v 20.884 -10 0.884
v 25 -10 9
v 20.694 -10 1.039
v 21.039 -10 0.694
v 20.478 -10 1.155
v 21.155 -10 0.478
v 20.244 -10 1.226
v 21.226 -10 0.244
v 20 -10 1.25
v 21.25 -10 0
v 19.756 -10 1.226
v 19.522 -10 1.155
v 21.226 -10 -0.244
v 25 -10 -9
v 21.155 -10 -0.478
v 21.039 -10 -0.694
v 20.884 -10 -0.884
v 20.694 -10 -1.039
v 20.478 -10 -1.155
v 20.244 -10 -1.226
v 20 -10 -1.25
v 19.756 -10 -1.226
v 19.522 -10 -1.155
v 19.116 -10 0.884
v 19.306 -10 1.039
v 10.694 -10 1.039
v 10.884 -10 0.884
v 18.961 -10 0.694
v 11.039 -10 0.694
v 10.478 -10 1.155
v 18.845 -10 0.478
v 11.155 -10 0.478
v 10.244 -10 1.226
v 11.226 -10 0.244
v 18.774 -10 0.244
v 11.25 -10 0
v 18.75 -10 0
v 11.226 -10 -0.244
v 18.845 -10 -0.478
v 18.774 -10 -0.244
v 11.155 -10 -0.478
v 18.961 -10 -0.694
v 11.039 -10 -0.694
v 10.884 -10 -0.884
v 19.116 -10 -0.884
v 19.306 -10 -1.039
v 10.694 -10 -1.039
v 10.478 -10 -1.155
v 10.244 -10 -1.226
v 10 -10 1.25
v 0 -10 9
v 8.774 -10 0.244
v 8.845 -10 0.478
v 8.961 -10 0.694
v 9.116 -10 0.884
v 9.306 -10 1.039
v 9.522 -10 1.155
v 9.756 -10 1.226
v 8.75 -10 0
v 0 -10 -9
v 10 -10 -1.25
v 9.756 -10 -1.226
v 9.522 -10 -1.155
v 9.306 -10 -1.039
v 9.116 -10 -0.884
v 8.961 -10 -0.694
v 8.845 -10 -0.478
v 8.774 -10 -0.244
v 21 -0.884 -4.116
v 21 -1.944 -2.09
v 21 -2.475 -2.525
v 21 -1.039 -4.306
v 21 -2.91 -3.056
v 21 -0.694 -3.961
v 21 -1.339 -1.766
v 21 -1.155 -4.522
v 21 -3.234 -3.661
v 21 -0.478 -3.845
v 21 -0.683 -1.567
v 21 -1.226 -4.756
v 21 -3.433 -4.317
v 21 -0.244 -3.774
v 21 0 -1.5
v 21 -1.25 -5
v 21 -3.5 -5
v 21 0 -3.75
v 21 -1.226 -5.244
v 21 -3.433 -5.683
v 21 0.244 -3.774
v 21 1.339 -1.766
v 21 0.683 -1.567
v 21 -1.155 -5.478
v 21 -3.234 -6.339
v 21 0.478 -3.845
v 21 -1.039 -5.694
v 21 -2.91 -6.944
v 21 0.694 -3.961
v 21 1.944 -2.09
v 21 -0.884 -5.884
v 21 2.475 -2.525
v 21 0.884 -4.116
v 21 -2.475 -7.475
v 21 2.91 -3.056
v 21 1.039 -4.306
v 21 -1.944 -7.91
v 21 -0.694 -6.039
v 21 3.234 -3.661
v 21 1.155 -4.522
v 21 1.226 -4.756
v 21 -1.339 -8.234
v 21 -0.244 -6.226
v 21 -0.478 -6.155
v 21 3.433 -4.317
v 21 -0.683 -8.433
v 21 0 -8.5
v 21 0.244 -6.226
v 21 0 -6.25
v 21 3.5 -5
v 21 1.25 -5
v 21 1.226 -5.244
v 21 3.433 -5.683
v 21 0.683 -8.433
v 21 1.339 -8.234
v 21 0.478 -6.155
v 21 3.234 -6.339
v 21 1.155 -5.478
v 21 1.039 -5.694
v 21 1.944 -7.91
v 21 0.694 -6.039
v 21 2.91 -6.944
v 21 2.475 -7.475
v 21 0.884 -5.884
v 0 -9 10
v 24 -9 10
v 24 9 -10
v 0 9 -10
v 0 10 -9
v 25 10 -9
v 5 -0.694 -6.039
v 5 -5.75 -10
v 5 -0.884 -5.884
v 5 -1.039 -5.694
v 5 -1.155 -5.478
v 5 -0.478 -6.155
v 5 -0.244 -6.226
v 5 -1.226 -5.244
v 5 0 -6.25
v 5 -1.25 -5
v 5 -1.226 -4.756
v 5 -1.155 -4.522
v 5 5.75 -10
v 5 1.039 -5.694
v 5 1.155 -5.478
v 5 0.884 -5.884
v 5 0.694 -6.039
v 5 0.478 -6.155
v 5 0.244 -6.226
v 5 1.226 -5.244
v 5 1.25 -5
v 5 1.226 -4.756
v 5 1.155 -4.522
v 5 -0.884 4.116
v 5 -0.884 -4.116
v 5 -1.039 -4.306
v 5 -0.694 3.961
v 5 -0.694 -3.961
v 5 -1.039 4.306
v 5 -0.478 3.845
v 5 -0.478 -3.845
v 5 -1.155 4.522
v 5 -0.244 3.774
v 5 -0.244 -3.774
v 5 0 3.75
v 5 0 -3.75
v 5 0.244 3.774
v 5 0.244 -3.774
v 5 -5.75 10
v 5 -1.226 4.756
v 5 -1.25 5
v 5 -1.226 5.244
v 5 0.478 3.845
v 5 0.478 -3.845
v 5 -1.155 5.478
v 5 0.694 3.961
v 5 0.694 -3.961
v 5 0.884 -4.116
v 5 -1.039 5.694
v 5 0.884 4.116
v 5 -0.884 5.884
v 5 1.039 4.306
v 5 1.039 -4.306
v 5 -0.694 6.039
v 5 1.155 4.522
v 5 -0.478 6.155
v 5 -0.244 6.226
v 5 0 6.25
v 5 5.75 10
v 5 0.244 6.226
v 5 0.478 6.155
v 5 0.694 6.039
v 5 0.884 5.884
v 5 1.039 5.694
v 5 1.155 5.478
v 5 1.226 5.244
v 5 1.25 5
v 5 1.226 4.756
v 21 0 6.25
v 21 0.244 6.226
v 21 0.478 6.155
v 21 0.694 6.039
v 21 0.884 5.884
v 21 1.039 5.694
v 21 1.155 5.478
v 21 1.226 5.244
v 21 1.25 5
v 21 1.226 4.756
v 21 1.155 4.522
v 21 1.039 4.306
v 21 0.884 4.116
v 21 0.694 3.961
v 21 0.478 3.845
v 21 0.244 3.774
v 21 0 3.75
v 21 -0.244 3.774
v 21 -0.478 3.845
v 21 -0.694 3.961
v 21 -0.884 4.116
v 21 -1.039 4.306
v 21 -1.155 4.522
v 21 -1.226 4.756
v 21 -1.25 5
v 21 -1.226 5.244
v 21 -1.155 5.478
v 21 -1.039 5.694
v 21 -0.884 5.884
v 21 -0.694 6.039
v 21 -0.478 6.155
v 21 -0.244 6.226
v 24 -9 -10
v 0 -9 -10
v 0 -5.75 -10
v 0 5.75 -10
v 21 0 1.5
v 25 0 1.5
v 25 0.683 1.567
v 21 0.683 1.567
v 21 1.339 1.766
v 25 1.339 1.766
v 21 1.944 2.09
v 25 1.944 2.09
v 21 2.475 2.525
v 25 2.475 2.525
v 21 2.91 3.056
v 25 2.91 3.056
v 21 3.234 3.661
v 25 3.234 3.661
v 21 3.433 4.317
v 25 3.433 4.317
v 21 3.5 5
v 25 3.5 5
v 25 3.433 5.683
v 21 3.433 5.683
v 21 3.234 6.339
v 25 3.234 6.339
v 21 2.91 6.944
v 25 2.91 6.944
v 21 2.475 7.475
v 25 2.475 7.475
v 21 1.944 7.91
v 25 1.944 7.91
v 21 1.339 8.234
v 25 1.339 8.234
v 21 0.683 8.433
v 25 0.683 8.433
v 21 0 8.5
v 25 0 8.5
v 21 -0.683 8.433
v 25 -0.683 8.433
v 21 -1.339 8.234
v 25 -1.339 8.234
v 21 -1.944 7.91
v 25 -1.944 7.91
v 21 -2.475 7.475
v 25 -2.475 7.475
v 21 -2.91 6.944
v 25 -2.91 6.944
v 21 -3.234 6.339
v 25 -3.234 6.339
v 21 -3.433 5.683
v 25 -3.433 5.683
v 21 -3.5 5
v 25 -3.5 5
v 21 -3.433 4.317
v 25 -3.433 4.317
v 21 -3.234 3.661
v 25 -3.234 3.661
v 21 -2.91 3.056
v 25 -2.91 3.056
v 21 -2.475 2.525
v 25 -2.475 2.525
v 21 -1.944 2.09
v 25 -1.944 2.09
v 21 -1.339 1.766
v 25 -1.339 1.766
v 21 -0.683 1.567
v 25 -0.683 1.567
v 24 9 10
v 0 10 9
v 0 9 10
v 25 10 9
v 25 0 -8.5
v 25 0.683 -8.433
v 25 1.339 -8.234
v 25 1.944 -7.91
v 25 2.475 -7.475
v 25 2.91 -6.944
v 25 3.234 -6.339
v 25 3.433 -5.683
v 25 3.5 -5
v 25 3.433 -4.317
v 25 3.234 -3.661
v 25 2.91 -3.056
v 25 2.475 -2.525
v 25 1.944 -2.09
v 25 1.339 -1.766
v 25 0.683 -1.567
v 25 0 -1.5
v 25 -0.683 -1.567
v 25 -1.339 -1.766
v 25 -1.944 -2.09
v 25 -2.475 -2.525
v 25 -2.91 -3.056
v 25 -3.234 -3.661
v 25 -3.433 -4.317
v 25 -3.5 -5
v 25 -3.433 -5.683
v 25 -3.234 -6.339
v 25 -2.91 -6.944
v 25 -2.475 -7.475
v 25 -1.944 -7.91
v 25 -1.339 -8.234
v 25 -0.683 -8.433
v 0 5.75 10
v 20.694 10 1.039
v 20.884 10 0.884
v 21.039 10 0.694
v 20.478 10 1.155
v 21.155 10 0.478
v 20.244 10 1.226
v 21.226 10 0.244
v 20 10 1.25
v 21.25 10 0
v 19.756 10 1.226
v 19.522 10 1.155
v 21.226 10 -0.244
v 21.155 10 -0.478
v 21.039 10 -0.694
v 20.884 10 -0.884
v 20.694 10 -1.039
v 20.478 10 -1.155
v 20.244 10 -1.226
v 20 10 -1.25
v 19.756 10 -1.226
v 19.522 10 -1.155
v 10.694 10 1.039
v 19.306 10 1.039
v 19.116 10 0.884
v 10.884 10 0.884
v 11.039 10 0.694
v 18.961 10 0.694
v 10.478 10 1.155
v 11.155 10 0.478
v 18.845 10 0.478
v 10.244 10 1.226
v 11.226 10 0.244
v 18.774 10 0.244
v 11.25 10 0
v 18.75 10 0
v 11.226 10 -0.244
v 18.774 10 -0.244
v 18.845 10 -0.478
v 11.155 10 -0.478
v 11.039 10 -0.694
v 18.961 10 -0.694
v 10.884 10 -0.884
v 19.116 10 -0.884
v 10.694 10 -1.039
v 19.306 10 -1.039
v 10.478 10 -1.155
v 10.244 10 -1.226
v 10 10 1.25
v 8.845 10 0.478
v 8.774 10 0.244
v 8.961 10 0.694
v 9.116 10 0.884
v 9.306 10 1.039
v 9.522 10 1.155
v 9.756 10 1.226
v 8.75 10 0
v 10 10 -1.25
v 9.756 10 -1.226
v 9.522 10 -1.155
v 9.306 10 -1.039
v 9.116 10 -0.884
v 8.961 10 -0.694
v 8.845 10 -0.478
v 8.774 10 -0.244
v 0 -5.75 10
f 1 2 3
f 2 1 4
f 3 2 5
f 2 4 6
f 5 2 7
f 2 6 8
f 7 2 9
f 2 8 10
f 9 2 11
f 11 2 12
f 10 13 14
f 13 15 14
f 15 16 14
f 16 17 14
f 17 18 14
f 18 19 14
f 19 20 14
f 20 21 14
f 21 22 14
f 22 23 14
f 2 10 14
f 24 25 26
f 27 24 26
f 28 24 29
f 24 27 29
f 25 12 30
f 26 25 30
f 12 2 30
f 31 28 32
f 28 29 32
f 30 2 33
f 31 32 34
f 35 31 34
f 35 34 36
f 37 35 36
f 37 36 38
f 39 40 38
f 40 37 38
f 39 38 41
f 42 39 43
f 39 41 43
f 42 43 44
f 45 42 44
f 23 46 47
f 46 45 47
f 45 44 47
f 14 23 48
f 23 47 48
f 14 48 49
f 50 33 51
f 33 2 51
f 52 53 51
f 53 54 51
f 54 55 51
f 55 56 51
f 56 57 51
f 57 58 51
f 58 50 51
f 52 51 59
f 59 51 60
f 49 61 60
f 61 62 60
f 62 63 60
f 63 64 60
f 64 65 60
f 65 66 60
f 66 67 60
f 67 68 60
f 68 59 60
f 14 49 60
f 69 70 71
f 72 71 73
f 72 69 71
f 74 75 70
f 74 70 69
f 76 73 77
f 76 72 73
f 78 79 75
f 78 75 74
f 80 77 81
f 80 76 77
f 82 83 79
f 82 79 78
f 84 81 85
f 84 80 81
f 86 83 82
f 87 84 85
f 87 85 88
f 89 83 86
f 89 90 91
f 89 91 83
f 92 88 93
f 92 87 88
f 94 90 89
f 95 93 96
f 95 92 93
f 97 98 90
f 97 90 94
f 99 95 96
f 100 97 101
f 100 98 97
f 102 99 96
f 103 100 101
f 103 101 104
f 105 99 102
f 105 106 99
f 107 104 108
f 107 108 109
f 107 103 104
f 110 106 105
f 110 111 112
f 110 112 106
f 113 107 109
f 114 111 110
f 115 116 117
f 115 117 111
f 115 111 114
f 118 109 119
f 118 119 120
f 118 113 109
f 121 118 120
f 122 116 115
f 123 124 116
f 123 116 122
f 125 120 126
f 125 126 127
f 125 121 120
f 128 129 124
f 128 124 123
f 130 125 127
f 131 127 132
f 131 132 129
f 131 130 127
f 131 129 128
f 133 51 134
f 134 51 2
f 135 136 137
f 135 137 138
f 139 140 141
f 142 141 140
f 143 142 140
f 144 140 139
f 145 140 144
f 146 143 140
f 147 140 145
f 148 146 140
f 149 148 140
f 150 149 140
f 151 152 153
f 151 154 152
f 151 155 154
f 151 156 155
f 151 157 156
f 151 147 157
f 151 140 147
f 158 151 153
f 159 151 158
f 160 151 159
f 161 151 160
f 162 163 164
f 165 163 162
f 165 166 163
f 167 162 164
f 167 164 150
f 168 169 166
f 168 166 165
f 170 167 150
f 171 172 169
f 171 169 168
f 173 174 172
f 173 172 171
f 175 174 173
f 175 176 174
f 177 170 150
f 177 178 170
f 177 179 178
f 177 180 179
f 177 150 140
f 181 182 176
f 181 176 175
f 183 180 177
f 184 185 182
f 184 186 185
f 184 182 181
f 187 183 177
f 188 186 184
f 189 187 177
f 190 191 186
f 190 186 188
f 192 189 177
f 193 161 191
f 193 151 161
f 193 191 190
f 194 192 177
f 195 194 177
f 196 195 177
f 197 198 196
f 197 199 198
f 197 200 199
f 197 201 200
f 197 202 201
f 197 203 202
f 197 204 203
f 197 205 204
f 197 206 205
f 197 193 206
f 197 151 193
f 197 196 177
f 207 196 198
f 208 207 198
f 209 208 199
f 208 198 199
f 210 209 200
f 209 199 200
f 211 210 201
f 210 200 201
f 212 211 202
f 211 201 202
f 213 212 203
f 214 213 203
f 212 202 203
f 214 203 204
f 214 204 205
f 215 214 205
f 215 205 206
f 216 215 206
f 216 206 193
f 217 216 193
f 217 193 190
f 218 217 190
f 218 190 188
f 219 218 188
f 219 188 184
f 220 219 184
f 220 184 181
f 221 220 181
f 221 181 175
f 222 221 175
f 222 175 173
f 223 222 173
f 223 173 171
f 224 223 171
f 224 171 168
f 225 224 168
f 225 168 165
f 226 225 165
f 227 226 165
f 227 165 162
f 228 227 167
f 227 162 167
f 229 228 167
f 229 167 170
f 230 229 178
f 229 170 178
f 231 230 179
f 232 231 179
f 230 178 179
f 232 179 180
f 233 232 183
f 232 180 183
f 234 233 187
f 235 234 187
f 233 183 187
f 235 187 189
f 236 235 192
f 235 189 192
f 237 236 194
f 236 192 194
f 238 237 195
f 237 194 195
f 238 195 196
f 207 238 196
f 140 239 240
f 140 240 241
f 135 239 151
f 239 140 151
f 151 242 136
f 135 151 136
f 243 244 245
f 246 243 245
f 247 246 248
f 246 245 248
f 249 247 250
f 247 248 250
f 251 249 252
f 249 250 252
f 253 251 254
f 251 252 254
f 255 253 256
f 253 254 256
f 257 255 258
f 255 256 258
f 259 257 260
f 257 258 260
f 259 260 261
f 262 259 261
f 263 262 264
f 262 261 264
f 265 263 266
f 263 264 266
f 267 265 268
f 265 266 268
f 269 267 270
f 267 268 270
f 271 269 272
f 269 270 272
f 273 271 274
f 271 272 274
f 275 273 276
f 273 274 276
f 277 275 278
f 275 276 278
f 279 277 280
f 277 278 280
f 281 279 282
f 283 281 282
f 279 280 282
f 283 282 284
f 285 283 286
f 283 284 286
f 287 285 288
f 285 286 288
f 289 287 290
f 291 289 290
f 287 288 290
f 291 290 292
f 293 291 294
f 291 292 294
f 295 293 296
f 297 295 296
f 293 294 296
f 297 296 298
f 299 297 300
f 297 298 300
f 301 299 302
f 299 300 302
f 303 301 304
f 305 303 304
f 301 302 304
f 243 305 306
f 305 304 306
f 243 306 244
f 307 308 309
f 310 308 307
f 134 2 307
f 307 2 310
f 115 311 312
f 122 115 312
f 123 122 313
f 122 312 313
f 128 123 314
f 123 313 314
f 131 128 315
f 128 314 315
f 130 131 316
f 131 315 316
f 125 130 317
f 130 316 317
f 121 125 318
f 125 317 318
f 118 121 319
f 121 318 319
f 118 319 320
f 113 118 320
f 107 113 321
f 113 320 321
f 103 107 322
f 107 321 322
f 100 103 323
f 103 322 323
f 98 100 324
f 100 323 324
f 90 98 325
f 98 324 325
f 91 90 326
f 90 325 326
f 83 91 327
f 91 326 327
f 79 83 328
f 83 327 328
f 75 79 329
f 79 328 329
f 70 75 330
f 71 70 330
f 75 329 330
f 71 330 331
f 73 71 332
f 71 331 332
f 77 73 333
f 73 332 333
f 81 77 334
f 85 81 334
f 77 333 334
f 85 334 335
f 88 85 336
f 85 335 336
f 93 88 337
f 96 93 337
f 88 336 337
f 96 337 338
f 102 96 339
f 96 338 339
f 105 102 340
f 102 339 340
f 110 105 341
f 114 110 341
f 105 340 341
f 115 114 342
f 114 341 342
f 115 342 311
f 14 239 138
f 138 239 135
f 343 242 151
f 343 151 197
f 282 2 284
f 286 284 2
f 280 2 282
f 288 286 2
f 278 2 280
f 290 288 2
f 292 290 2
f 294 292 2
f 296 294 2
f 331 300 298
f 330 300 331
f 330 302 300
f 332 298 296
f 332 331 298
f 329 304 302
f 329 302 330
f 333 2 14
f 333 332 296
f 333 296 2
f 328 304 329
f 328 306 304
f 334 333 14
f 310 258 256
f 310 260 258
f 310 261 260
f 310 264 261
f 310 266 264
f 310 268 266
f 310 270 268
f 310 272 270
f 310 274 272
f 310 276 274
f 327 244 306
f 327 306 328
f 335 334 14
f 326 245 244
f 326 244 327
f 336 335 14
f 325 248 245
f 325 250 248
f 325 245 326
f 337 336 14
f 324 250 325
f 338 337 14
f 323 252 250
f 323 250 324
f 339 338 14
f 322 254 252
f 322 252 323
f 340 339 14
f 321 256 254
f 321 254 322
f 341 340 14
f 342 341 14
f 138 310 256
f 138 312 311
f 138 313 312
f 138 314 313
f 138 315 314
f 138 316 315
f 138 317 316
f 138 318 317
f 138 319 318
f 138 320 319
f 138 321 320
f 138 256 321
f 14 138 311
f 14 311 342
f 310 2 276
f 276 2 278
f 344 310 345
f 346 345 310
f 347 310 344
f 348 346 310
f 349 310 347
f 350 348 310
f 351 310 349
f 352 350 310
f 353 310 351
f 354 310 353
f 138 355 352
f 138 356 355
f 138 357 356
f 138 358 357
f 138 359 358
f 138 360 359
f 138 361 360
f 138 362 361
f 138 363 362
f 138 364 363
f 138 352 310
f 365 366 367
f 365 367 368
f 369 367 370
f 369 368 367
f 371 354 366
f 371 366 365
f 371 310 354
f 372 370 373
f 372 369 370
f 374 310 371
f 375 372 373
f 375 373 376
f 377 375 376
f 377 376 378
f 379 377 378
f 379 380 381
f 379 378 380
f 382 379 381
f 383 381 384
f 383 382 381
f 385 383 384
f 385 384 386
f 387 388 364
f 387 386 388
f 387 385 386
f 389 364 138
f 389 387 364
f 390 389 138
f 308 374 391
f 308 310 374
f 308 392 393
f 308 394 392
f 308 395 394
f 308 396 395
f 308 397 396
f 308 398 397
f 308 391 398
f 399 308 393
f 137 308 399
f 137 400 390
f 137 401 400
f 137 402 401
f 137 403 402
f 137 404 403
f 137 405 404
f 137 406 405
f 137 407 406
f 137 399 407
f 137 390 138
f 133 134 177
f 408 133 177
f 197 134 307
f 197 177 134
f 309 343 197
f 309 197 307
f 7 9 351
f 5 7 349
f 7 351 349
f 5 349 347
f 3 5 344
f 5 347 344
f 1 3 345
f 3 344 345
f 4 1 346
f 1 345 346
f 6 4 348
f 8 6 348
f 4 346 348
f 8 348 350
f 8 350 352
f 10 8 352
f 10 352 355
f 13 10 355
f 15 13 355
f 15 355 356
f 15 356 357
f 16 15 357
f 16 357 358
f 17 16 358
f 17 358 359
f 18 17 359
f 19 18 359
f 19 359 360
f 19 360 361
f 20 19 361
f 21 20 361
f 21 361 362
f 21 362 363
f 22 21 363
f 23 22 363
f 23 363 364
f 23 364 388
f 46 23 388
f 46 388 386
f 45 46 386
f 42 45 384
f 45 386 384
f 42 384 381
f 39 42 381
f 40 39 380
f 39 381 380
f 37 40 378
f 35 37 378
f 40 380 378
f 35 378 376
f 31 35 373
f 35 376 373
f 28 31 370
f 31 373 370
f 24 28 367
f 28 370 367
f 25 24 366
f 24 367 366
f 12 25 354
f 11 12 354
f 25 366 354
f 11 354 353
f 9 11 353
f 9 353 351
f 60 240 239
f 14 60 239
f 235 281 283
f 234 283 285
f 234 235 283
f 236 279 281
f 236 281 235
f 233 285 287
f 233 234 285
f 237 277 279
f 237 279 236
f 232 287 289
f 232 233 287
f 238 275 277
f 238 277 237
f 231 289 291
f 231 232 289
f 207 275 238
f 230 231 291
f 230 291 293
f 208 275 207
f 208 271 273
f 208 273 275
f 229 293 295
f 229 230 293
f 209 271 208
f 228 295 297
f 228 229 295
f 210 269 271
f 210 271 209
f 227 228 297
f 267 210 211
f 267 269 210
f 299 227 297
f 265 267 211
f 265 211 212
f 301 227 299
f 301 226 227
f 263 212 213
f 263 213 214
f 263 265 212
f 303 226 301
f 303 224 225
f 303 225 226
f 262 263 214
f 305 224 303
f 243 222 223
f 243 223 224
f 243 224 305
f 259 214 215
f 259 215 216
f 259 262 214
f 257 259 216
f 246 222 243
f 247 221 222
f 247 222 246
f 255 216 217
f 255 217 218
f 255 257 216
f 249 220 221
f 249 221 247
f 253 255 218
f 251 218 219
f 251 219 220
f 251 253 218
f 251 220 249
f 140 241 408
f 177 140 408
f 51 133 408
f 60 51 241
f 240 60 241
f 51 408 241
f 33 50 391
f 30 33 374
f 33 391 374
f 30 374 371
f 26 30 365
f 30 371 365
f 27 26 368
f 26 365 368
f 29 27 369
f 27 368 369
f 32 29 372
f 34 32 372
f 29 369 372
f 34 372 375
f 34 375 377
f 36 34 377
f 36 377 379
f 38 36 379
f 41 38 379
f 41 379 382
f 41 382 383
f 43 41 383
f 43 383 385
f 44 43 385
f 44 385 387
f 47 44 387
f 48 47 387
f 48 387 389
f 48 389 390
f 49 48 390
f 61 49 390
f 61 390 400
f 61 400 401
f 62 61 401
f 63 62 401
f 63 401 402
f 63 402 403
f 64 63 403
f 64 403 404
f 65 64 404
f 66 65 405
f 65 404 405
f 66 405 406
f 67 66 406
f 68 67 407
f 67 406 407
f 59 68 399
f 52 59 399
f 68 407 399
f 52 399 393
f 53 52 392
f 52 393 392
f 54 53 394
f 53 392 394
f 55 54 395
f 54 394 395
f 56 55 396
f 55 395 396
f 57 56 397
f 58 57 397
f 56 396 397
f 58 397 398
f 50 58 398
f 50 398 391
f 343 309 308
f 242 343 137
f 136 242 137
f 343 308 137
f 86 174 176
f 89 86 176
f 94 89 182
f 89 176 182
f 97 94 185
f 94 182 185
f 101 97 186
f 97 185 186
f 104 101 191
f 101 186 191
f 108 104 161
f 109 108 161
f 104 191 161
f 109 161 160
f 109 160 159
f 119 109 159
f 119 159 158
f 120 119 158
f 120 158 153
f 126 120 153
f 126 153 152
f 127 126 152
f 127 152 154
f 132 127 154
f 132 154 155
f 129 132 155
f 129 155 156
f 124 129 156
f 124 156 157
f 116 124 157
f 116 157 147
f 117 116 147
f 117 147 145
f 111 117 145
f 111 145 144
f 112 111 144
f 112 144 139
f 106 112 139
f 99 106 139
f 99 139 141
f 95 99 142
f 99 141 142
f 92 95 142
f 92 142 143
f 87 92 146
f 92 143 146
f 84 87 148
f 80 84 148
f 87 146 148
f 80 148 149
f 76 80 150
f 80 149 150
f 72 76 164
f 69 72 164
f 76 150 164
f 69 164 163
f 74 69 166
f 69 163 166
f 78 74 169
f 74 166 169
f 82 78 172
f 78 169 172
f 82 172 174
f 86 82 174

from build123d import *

# Parameters (mm, degrees)
SKETCH_1_W          = 20
SKETCH_1_H          = 20
EXTRUDE_1_DEPTH     = 25
SKETCH_2_W          = 20
SKETCH_2_H          = 11.5
CUT_EXTRUDE_1_DEPTH = 5
SKETCH_3_R          = 1.25
CUT_EXTRUDE_2_DEPTH = 25.494897428
SKETCH_4_R          = 1.25
CUT_EXTRUDE_3_DEPTH = 34.541019662
CHAMFER_1_SIZE      = 1
SKETCH_6_R          = 3.5
CUT_EXTRUDE_4_DEPTH = 4


with BuildPart() as part:
    # 草图1 → 凸台-拉伸1 (new body)
    with BuildSketch(Plane(origin=(0, 0, 0), x_dir=(0, 0, -1), z_dir=(1, 0, 0))):
        Rectangle(SKETCH_1_W, SKETCH_1_H)
    extrude(amount=EXTRUDE_1_DEPTH)

    # 草图2 → 切除-拉伸1 (cut)
    with BuildSketch(Plane.ZY):
        Rectangle(SKETCH_2_W, SKETCH_2_H)
    extrude(amount=-CUT_EXTRUDE_1_DEPTH, mode=Mode.SUBTRACT)

    # 草图3 → 切除-拉伸2 (cut, through all)
    with BuildSketch(Plane.ZY.offset(-5)):
        with Locations((-5, 0)):
            Circle(SKETCH_3_R)
        with Locations((5, 0)):
            Circle(SKETCH_3_R)
    extrude(amount=-CUT_EXTRUDE_2_DEPTH, mode=Mode.SUBTRACT)

    # 草图4 → 切除-拉伸3 (cut, through all)
    with BuildSketch(Plane(origin=(0, 10, 0), x_dir=(1, 0, 0), z_dir=(0, 1, 0))):
        with Locations(Location((20, 0, 0), (0, 0, 270))):
            Circle(SKETCH_4_R)
        with Locations(Location((10, 0, 0), (0, 0, 270))):
            Circle(SKETCH_4_R)
    extrude(amount=-CUT_EXTRUDE_3_DEPTH, mode=Mode.SUBTRACT)

    # 倒角1
    chamfer_1_edges = [part.edges().sort_by_distance(p)[0] for p in [
        (25, 0, -10),
        (25, 0, 10),
        (12.5, 10, 10),
        (12.5, 10, -10),
        (12.5, -10, -10),
        (12.5, -10, 10),
    ]]
    chamfer(chamfer_1_edges, length=CHAMFER_1_SIZE)

    # 草图6 → 切除-拉伸4 (cut)
    with BuildSketch(Plane(origin=(25, 0, 0), x_dir=(0, 0, -1), z_dir=(1, 0, 0))):
        with Locations((-5, 0)):
            Circle(SKETCH_6_R)
        with Locations((5, 0)):
            Circle(SKETCH_6_R)
    extrude(amount=-CUT_EXTRUDE_4_DEPTH, mode=Mode.SUBTRACT)


solid = part.part
